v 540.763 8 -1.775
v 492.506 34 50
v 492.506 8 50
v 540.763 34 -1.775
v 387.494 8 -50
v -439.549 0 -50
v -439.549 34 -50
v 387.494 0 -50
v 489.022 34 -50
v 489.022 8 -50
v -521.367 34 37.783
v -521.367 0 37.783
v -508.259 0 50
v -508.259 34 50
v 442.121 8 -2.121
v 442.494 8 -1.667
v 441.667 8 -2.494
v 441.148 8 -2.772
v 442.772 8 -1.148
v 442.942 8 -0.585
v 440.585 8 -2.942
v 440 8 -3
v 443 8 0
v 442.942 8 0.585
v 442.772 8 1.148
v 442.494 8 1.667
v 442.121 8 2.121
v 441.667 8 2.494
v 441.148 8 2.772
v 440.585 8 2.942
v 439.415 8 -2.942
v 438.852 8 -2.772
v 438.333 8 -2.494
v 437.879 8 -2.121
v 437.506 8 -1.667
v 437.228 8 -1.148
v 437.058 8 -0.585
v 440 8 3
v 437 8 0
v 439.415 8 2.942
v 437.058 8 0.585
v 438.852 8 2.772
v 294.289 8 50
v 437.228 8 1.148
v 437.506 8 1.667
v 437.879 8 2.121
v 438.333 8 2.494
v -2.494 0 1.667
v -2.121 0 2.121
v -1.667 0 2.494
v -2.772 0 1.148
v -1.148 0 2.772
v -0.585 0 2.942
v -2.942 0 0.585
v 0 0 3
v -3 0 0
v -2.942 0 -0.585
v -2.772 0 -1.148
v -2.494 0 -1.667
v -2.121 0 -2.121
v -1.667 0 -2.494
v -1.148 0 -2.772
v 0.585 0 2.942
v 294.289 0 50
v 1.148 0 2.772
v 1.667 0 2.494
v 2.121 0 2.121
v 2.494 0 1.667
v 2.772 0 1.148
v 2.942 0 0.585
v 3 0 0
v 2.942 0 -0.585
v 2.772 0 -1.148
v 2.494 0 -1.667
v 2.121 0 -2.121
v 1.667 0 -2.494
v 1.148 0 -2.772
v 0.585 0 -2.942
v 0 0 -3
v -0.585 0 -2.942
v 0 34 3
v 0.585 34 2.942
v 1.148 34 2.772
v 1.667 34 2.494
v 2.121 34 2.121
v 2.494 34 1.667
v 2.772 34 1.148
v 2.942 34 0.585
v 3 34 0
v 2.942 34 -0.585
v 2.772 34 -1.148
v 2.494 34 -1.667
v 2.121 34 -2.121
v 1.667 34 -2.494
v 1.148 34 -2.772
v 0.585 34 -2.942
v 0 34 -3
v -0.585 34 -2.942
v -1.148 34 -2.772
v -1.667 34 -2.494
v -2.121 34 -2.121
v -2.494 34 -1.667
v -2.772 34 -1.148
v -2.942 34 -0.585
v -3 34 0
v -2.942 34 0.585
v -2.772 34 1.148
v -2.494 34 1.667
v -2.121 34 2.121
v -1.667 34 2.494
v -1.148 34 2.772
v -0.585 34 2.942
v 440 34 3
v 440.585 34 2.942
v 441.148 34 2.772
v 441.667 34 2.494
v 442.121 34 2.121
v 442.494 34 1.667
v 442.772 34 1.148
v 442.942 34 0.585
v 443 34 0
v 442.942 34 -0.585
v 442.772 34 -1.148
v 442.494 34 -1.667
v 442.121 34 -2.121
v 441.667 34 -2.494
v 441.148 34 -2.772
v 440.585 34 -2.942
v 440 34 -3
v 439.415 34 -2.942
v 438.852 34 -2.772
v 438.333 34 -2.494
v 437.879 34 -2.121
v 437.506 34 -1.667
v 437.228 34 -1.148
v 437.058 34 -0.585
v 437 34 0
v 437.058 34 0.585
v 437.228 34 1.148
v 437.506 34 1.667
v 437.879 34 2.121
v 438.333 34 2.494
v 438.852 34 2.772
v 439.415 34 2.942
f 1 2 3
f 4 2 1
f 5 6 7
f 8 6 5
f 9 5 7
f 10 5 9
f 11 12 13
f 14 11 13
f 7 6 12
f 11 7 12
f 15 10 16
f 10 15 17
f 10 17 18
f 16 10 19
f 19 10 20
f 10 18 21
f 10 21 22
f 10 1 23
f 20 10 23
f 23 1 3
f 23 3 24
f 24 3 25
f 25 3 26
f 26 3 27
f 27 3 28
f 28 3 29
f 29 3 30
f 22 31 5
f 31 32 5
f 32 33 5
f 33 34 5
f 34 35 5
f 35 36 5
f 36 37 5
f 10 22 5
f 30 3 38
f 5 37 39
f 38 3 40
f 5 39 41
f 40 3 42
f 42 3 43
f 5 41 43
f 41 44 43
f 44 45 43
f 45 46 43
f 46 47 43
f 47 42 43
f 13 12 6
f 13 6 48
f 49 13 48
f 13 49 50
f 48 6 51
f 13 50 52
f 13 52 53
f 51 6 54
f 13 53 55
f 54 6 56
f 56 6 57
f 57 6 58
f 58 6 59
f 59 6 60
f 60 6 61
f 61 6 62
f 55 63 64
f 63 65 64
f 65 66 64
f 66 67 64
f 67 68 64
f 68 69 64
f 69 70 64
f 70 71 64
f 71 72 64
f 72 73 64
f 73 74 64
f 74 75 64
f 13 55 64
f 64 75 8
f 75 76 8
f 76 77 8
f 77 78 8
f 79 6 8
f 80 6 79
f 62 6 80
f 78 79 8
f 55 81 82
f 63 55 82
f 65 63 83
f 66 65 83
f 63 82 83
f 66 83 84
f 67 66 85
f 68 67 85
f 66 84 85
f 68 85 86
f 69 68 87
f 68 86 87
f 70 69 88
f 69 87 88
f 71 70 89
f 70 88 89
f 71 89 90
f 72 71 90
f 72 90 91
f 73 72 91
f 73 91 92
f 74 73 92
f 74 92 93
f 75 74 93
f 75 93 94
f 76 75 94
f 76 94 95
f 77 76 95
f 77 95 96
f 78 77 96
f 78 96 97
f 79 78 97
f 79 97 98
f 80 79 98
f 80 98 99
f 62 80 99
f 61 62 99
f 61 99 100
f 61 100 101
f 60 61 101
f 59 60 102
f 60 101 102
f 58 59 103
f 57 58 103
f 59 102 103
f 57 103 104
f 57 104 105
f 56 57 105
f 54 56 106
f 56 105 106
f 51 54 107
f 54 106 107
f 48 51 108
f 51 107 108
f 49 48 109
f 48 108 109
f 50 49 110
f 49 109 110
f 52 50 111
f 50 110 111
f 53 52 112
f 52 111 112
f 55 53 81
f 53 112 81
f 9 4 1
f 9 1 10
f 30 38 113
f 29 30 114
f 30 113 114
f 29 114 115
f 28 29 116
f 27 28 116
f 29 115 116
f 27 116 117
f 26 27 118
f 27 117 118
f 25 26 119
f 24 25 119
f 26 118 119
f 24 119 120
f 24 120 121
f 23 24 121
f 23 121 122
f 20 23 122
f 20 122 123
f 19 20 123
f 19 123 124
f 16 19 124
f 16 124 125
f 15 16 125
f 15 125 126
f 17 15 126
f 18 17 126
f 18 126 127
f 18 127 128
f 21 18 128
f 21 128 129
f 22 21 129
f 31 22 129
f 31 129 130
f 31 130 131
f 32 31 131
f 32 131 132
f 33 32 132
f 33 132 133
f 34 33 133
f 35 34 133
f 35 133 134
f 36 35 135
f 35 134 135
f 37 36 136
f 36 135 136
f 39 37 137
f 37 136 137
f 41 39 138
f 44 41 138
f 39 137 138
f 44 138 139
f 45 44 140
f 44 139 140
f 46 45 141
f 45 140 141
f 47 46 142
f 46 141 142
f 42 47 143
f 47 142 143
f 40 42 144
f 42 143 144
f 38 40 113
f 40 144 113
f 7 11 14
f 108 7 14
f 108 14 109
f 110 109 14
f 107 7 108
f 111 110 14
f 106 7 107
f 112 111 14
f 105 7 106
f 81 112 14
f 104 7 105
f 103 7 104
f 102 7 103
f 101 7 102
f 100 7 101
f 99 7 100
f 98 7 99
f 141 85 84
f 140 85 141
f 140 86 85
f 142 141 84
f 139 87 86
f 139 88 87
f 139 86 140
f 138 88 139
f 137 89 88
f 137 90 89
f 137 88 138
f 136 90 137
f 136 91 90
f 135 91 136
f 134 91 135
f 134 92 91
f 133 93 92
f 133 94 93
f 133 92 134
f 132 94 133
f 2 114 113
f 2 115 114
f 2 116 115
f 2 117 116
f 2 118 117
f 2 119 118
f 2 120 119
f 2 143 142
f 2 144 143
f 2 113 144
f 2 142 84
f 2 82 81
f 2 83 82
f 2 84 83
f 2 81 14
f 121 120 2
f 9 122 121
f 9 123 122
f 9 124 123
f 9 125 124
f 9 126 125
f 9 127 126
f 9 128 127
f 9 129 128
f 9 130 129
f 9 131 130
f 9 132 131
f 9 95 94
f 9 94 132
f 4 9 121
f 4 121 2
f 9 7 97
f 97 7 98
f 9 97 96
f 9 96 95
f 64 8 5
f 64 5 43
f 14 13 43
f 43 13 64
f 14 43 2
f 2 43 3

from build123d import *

# Parameters (mm, degrees)
SKETCH1_W           = 1100
SKETCH1_H           = 100
BOSS_EXTRUDE1_DEPTH = 34
SKETCH2_R           = 3
CUT_EXTRUDE1_DEPTH  = 554.313654269
LPATTERN1_COUNT     = 2
LPATTERN1_PITCH     = 440
CUT_EXTRUDE2_DEPTH  = 554.313654269
CUT_EXTRUDE3_DEPTH  = 554.313654269
CUT_EXTRUDE4_DEPTH  = 8


with BuildPart() as part:
    # Sketch1 → Boss-Extrude1 (new body)
    with BuildSketch(Plane(origin=(0, 0, 0), x_dir=(1, 0, 0), z_dir=(0, 1, 0))):
        Rectangle(SKETCH1_W, SKETCH1_H)
    extrude(amount=BOSS_EXTRUDE1_DEPTH)

    # Sketch2 → Cut-Extrude1 (cut, through all)
    with BuildSketch(Plane(origin=(0, 34, 0), x_dir=(1, 0, 0), z_dir=(0, 1, 0))):
        with Locations(Location((0, 0, 0), (0, 0, 270))):
            Circle(SKETCH2_R)
    cut_extrude1 = extrude(amount=-CUT_EXTRUDE1_DEPTH, mode=Mode.SUBTRACT)

    # LPattern1: Cut-Extrude1 ×2
    with Locations(*[(i * LPATTERN1_PITCH, 0, 0) for i in range(1, LPATTERN1_COUNT)]):
        add(cut_extrude1, mode=Mode.SUBTRACT)

    # Sketch3 → Cut-Extrude2 (cut, through all)
    with BuildSketch(Plane(origin=(0, 34, 0), x_dir=(1, 0, 0), z_dir=(0, 1, 0))):
        Polygon((540.762594459, 1.774699353), (414.907482272, 119.078541768), (523.885555732, 236.000949243), (780.808453445, 33.355832904), (490.286548009, -251.902570915), (394.883300151, -154.73897124), align=None)
    extrude(amount=-CUT_EXTRUDE2_DEPTH, mode=Mode.SUBTRACT)

    # Sketch4 → Cut-Extrude3 (cut, through all)
    with BuildSketch(Plane.XZ):
        Polygon((-439.548903775, -50), (-521.367085593, 37.782601488), (-461.555021583, 93.530713814), (-639.566149279, 284.518579051), (-887.964366722, 45.983956755), (-622.18599326, -220.227748335), align=None)
    extrude(amount=-CUT_EXTRUDE3_DEPTH, mode=Mode.SUBTRACT)

    # Sketch5 → Cut-Extrude4 (cut)
    with BuildSketch(Plane.XZ):
        Polygon((457.65907548, -125.279728267), (196.673608083, 154.731178471), (458.273207913, 338.877030437), (810.658904172, -71.072769519), align=None)
    extrude(amount=-CUT_EXTRUDE4_DEPTH, mode=Mode.SUBTRACT)


solid = part.part
